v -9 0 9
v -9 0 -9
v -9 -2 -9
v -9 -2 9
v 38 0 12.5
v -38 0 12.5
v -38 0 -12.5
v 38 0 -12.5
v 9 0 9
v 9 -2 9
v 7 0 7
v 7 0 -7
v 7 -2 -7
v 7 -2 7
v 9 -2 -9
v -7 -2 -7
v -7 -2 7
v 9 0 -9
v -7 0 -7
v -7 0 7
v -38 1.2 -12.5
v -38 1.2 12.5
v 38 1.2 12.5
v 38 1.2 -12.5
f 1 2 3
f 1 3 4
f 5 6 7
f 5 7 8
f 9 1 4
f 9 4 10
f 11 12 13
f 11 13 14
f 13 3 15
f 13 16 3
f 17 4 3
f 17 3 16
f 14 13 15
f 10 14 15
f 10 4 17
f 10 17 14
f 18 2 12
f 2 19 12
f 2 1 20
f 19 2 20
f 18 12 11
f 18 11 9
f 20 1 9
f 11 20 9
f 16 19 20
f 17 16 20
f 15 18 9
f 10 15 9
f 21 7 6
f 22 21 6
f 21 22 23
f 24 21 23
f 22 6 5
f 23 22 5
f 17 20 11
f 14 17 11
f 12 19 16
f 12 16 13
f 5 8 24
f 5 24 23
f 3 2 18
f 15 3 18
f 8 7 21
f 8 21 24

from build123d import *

# Parameters (mm, degrees)
F0_W     = 18
F0_H     = 18
F0_W_2   = 14
F0_H_2   = 14
F1_DEPTH = 2
F2_W     = 76
F2_H     = 25
F3_DEPTH = 1.2


with BuildPart() as f1:
    # F0 (on Front) → F1 (new body)
    with BuildSketch(Plane.XZ):
        Rectangle(F0_W, F0_H)
        Rectangle(F0_W_2, F0_H_2, mode=Mode.SUBTRACT)
    extrude(amount=F1_DEPTH)


with BuildPart() as f3:
    # F2 (on Front) → F3 (new body)
    with BuildSketch(Plane.XZ):
        Rectangle(F2_W, F2_H)
    extrude(amount=-F3_DEPTH)


solid = Compound([f1.part, f3.part])
